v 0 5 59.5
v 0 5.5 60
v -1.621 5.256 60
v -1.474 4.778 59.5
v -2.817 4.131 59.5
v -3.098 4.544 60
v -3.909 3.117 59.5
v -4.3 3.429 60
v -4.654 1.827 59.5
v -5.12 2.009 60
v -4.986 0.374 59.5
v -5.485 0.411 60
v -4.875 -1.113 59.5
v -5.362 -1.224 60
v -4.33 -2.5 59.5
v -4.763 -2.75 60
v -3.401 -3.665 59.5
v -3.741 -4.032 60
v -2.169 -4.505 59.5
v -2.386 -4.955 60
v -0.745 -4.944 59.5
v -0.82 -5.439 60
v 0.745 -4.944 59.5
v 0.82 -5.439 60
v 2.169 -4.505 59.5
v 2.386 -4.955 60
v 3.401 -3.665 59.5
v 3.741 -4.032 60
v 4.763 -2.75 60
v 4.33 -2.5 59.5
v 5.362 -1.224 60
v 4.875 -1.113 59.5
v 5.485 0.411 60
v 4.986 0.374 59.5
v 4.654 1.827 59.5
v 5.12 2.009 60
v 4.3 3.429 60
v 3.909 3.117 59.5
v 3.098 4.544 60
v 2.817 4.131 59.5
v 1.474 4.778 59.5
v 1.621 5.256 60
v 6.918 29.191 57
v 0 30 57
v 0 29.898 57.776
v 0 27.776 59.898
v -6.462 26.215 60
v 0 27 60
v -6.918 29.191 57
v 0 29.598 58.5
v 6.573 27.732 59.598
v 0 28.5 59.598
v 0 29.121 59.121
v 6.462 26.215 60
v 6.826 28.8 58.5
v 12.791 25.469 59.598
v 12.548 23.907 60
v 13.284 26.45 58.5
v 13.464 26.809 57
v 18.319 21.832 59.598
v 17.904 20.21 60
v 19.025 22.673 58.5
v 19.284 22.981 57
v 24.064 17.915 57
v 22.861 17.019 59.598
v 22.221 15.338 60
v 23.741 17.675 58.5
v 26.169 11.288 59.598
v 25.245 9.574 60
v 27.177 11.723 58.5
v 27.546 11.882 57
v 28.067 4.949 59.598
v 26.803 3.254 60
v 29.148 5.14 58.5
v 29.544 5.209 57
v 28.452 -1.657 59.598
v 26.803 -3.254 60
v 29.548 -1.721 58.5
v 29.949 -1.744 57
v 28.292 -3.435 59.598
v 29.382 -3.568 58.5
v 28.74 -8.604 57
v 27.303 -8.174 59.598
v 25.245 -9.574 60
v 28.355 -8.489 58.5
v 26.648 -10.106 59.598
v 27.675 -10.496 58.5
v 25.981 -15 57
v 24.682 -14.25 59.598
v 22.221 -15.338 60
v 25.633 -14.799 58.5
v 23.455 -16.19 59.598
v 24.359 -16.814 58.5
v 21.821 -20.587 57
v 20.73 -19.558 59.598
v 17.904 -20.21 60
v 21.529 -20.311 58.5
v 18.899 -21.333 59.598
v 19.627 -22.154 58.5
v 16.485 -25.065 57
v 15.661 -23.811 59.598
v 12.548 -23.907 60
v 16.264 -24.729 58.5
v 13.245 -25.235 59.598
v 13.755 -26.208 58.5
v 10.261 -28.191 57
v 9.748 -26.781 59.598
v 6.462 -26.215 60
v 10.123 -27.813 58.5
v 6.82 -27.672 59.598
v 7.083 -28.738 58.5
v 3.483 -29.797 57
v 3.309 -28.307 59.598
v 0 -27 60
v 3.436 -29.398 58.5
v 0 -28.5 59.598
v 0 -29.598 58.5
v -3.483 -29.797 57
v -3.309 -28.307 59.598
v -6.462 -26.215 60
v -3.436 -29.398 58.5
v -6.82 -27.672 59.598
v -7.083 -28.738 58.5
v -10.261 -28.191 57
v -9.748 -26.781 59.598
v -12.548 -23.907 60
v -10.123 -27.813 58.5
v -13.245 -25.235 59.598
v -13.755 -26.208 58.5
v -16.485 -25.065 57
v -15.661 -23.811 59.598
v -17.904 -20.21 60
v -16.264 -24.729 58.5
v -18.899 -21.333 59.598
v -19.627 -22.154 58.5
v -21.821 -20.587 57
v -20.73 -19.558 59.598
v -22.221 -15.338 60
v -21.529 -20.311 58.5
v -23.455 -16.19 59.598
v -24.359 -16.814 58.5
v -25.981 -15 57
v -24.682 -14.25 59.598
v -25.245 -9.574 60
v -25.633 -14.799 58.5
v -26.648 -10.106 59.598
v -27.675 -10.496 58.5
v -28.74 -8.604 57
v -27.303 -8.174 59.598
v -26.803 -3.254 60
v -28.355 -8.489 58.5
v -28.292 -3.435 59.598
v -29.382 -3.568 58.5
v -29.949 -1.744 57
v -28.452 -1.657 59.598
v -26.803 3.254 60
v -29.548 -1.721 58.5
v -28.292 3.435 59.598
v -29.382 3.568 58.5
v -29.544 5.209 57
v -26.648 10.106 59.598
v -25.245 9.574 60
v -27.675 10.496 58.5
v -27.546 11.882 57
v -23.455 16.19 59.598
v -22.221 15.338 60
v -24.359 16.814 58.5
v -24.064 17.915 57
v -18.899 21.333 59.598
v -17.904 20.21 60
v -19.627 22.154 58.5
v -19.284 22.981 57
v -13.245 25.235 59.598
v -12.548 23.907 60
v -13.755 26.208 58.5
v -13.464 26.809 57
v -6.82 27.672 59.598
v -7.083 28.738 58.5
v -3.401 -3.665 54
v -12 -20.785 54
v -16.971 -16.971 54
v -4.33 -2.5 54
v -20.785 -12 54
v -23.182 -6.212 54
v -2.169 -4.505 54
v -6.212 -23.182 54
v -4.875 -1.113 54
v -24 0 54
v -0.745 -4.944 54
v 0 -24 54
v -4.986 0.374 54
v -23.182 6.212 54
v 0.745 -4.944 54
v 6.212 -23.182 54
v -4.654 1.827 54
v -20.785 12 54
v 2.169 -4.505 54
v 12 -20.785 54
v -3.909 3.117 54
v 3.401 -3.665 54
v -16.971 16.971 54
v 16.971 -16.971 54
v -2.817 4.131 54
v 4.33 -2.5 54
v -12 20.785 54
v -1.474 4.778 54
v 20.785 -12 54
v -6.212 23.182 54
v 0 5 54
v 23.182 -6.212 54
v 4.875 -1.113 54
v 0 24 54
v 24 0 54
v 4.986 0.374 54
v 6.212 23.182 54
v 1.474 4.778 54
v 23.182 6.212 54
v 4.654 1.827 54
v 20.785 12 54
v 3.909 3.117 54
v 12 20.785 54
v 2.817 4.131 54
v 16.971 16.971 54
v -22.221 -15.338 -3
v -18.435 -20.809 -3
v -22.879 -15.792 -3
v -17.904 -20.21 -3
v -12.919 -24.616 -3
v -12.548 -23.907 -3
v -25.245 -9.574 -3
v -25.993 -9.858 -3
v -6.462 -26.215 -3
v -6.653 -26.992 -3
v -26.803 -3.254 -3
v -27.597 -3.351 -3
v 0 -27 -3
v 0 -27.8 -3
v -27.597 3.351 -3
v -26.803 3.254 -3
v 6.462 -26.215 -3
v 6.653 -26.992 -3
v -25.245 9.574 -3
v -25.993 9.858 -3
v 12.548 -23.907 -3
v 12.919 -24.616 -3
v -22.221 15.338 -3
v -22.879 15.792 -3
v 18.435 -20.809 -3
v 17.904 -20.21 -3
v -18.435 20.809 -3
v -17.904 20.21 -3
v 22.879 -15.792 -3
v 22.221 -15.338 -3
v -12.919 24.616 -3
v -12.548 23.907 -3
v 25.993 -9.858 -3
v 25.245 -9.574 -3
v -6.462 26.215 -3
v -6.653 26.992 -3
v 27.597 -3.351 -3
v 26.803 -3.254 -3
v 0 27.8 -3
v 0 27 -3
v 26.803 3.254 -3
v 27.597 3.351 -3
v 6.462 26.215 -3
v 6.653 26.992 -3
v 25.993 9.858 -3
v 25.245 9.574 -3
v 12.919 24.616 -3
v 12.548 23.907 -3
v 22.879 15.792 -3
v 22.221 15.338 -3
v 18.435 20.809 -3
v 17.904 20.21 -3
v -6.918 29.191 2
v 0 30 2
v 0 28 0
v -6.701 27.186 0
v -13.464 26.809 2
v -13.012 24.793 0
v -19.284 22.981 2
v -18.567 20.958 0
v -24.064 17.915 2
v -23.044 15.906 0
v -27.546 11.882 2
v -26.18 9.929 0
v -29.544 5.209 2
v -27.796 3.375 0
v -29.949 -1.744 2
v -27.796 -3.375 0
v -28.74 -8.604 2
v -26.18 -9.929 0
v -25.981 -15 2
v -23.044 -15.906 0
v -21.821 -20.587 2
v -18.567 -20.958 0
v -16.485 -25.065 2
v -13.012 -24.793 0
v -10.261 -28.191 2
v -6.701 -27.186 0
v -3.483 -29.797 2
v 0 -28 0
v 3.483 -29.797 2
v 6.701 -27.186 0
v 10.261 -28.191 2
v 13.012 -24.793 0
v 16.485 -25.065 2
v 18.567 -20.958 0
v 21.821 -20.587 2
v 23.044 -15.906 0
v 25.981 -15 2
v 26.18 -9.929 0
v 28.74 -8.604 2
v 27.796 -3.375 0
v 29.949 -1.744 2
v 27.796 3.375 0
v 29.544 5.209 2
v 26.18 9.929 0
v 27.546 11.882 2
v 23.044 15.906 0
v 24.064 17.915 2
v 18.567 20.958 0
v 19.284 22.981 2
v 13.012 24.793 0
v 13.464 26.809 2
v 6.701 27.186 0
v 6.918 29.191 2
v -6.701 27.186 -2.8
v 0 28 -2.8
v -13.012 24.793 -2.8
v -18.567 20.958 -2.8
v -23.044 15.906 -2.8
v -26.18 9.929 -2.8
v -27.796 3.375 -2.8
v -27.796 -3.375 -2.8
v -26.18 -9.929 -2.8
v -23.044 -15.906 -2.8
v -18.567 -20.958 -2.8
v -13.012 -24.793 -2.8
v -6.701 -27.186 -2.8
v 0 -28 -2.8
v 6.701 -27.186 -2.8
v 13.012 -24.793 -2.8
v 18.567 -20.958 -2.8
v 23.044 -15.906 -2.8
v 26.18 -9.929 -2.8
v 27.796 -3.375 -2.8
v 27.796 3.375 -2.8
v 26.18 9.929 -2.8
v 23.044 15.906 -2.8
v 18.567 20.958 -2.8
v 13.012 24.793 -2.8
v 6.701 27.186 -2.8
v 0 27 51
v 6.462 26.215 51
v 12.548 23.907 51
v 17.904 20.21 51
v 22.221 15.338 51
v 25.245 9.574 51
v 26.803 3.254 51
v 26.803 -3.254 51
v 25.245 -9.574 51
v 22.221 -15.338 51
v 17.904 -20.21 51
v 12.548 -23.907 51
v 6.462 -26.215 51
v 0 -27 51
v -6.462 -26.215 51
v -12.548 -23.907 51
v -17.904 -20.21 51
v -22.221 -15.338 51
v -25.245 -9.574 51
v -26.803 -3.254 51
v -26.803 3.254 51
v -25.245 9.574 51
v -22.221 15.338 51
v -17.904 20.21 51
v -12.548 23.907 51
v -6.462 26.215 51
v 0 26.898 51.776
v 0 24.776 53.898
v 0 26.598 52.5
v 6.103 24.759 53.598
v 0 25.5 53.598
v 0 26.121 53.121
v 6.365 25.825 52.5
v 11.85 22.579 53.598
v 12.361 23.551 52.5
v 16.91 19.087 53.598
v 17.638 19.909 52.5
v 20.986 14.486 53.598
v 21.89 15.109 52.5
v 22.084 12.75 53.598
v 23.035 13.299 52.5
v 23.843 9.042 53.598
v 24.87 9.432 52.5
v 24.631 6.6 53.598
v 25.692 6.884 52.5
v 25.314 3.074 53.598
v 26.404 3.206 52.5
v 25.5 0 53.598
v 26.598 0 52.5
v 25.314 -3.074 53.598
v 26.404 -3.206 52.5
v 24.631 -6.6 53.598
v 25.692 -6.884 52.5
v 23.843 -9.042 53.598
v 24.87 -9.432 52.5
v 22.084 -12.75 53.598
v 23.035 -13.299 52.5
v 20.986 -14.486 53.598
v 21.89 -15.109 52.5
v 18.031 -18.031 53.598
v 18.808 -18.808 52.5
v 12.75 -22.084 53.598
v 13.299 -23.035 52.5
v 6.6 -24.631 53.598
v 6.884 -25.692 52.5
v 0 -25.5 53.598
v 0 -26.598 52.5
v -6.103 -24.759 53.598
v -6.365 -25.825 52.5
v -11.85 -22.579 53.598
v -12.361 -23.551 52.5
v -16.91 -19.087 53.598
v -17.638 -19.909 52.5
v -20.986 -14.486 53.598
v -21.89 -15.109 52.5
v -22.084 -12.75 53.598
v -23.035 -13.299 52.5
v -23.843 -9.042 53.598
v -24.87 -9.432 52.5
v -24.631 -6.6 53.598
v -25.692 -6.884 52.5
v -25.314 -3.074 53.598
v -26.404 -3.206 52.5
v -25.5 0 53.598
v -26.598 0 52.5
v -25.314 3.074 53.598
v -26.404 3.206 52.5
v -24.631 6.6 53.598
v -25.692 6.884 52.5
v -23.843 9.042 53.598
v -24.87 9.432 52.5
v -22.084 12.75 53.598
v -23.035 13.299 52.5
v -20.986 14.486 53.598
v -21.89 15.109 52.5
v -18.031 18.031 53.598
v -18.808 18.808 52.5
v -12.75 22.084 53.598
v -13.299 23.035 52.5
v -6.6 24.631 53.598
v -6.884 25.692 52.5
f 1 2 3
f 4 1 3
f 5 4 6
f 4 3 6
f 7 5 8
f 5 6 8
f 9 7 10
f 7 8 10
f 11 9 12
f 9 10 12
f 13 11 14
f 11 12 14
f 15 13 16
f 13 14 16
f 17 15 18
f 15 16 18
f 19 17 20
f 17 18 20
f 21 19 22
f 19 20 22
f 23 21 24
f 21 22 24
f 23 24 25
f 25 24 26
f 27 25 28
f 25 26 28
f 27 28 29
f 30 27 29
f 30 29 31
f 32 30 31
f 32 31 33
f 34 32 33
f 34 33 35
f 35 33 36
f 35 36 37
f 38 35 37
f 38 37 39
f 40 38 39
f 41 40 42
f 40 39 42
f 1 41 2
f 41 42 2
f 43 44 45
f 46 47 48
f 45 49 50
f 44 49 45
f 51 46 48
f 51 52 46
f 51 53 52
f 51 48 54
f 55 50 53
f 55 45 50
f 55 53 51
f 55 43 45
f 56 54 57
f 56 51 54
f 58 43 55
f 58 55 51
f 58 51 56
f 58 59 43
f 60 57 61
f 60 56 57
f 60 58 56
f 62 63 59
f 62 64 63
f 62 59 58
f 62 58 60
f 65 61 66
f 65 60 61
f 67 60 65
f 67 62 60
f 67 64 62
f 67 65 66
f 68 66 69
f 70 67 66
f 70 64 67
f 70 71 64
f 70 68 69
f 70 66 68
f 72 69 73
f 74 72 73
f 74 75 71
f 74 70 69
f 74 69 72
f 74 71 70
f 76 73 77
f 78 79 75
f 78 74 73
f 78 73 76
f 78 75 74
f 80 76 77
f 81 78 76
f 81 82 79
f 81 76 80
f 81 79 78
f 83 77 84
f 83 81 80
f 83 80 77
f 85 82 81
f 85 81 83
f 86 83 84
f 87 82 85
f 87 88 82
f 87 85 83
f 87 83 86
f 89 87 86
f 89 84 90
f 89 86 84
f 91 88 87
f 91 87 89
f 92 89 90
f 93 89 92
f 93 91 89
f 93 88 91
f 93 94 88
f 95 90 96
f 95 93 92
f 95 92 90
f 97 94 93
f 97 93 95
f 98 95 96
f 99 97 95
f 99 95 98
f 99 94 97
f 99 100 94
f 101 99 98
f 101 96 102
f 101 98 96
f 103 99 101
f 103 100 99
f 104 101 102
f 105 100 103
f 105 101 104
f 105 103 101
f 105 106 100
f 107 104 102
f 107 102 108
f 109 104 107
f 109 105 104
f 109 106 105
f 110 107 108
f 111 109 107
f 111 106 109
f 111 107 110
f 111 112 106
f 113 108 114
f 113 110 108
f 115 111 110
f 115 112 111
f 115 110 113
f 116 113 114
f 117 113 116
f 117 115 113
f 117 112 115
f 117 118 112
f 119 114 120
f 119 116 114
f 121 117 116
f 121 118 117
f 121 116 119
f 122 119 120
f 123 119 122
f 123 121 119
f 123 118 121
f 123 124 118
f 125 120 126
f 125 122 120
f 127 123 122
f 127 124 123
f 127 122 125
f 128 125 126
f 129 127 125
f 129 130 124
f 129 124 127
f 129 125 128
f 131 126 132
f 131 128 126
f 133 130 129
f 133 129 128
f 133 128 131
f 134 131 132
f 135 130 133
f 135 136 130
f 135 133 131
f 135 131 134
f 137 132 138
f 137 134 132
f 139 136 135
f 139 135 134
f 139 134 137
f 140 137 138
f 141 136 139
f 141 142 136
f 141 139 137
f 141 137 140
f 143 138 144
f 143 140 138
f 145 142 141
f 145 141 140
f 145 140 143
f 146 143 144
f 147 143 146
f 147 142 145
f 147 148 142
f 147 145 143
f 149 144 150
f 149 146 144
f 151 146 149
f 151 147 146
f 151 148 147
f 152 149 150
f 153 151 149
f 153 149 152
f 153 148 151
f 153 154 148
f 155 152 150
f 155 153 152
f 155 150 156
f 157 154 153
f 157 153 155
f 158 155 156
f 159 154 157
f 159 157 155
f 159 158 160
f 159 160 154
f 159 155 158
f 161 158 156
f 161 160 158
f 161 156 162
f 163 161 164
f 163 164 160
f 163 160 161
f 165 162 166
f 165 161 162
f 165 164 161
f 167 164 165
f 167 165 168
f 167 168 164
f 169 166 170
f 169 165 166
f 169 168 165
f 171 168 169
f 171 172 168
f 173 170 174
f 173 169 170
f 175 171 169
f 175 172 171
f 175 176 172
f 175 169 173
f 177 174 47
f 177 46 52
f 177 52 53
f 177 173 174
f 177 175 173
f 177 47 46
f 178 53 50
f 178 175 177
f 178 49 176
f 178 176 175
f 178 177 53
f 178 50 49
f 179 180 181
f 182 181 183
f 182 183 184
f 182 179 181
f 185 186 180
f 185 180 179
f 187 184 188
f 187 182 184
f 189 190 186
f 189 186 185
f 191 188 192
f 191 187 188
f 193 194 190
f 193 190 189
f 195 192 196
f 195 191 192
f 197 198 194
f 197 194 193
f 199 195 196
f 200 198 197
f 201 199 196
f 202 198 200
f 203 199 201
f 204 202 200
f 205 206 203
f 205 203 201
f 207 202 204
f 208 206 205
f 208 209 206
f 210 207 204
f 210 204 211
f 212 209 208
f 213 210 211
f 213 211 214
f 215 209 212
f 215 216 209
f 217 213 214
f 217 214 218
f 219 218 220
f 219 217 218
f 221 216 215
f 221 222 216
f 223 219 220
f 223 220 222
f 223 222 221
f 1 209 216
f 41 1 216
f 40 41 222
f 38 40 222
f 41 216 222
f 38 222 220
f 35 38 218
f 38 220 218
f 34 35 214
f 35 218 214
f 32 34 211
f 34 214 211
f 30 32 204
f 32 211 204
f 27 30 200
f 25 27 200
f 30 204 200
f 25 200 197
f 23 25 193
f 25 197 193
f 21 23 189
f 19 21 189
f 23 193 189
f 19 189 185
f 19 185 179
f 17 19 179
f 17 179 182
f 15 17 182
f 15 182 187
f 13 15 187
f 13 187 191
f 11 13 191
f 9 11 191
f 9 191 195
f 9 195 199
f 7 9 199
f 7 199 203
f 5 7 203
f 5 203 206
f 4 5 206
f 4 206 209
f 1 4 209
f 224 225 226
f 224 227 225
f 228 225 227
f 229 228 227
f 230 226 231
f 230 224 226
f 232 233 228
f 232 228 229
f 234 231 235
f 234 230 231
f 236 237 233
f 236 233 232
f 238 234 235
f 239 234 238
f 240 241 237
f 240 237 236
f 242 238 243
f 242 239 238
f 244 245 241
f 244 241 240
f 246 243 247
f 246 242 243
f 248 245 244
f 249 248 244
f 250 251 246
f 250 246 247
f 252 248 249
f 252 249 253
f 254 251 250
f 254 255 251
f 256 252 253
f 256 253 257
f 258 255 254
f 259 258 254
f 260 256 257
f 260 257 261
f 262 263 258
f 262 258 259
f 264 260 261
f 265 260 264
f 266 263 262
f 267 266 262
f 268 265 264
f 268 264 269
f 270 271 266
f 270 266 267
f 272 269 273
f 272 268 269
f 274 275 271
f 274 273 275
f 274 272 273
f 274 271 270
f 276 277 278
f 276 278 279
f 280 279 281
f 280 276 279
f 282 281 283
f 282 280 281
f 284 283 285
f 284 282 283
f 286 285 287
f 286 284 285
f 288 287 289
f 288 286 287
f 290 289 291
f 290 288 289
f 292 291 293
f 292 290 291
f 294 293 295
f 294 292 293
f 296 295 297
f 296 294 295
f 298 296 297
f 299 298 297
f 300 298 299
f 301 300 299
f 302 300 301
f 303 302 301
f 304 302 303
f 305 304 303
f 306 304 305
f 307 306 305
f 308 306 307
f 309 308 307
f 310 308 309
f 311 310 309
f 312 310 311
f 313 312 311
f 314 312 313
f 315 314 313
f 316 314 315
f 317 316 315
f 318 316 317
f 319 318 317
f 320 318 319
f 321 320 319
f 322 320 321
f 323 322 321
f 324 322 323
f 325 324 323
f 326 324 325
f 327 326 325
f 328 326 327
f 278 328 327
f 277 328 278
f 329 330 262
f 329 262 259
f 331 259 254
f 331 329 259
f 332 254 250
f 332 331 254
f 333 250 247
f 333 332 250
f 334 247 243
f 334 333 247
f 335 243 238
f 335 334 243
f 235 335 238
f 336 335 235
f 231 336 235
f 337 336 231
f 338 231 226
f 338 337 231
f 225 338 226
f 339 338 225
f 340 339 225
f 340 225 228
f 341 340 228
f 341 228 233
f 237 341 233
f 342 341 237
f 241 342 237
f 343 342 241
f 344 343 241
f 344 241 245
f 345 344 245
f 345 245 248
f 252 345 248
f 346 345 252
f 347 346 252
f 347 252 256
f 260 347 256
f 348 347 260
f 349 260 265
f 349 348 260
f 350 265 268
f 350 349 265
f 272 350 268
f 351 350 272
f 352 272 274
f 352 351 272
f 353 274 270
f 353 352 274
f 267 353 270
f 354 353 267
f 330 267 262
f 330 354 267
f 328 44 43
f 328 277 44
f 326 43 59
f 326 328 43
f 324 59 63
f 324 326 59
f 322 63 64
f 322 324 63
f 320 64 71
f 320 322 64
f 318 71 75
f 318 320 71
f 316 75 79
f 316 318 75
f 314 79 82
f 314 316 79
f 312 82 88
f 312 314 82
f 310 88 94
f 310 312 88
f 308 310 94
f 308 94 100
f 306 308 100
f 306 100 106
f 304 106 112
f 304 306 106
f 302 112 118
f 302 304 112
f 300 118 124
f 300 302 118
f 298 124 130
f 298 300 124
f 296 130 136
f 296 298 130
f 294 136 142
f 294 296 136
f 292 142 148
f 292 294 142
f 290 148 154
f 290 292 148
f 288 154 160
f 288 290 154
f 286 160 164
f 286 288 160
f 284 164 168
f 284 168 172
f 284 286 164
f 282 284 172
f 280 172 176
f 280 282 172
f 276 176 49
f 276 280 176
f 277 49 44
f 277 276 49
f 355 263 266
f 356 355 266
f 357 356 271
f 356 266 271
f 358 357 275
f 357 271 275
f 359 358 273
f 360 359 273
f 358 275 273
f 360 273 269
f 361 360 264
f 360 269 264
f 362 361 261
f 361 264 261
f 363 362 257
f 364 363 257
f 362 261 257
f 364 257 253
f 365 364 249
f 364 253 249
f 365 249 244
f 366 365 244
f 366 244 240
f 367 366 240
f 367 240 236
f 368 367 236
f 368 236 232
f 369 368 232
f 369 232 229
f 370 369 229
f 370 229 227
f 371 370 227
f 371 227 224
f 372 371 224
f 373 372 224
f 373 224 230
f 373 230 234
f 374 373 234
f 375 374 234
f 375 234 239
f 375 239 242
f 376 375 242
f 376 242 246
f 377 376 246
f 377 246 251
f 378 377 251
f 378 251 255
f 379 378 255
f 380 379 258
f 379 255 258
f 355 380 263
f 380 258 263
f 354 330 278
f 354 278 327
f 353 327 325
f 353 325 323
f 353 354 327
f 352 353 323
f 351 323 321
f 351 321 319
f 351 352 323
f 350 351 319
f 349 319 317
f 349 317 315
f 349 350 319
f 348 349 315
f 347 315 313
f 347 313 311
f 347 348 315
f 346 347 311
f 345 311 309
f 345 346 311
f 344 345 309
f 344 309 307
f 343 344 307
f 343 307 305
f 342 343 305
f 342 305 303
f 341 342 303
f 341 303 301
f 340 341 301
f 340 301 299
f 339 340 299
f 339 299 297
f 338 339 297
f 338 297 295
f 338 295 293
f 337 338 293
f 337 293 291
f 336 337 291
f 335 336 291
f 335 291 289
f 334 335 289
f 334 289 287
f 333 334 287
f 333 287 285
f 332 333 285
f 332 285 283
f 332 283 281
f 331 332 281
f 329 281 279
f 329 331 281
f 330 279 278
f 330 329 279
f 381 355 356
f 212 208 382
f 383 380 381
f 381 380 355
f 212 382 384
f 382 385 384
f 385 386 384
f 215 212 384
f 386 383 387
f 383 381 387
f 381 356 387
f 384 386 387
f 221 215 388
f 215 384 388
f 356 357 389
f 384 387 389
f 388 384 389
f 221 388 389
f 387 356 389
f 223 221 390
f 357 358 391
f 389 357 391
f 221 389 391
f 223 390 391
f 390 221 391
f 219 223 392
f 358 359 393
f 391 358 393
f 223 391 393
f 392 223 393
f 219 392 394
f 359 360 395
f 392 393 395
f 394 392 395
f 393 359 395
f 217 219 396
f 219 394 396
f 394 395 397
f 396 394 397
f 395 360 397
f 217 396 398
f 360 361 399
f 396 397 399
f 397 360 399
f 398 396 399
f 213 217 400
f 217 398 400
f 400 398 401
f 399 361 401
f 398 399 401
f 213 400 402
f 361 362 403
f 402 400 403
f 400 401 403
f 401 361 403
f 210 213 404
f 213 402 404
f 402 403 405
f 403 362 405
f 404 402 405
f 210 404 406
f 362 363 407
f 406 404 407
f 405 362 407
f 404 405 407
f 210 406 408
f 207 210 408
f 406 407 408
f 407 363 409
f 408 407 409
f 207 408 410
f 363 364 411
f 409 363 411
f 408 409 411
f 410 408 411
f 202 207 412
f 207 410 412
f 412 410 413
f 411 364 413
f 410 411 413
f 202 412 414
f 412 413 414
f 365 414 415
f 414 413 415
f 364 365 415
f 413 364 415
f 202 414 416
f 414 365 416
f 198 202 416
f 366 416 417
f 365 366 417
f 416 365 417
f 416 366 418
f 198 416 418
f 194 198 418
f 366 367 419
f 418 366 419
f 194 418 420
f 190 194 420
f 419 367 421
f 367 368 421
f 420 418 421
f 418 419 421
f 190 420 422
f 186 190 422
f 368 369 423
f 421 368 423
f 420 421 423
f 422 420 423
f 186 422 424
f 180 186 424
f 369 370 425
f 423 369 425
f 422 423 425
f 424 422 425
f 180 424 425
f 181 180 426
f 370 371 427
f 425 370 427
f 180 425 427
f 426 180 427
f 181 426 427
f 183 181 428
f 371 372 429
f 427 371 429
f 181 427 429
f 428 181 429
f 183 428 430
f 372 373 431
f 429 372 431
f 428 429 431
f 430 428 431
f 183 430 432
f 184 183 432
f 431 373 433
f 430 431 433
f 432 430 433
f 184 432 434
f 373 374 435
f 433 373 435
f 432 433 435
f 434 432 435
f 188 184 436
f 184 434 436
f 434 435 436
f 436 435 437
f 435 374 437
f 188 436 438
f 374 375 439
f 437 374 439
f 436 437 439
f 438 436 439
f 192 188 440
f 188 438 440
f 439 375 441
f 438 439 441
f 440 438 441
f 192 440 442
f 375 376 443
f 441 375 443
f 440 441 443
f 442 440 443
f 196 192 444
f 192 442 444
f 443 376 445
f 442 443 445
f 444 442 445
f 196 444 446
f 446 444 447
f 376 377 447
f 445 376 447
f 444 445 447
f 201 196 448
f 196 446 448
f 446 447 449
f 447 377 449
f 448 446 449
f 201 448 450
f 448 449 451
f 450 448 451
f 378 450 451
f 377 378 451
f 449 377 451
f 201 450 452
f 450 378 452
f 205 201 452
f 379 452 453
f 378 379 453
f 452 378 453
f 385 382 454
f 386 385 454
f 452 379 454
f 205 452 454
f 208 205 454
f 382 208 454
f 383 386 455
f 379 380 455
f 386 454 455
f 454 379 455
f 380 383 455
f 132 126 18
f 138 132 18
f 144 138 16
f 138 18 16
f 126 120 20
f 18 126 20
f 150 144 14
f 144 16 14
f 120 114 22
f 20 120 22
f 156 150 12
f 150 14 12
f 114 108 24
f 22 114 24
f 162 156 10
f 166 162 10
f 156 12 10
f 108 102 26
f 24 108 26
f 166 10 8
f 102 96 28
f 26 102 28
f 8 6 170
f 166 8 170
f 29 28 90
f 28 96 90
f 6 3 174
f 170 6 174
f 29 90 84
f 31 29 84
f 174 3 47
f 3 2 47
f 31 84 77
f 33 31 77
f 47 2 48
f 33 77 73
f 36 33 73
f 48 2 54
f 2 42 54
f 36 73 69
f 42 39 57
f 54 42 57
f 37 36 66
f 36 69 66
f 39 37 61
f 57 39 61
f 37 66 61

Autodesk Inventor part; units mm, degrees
ref_plane "YZ Plane" through (0, 0, 0) normal (1, 0, 0) x (0, 1, 0)
ref_plane "XZ Plane" through (0, 0, 0) normal (0, 1, 0) x (-1, 0, 0)
ref_plane "XY Plane" through (0, 0, 0) normal (0, 0, 1) x (1, 0, 0)
sketch "Sketch2" plane through (0, 0, 0) normal (1, 0, 0) x (0, 1, 0)
  line L0 (0, 0) -> (30, 0)
  line L1 (30, 60) -> (30, -60)
  line L2 (30, 60) -> (27, 60)
  line L3 (27, 60) -> (27, -60)
  line L4 (27, -60) -> (30, -60)
  line L5 (27, 60) -> (0, 60)
  line L6 (0, 60) -> (5, 60)
  line L7 (5, 60) -> (5, 54)
  line L8 (5, 54) -> (27, 54)
  line L9 (27, -60) -> (0, -60)
  line L10 (0, -60) -> (5, -60)
  line L11 (5, -60) -> (5, -54)
  line L12 (5, -54) -> (27, -54)
  line L13 (0, 60) -> (0, -60)
  line L14 (27, 0) -> (28, 0)
  line L15 (28, 0) -> (28, -3)
  line L16 (28, -3) -> (27, -3)
  line L17 (28, 0) -> (28, 2)
  line L18 (28, 2) -> (30, 2)
  line L19 (30, 2) -> (28, 0)
  dimension "d12" = 30
  dimension "d13" = 120
  dimension "d14" = 3
  dimension "d15" = 5
  dimension "d16" = 6
  dimension "d17" = 6
  dimension "d26" = 1
  dimension "d27" = 3
  dimension "d28" = 2
revolve "Revolution1" add sketch "Sketch2" angle 360 about axis through (0, 0, 60) along (0, 0, -1) contours L3 L2 L1 L18 L17 L0 | L0 L15 L16 L3 | L17 L18 L19 | L8 L7 L5 L3
fillet "Fillet2" radius 3 1 edges at (0, -30, 60)
thread "Thread3" size "M10x1.5" class "6H" standard "ISO Metric profile" full length
chamfer "Chamfer2" distance 0.5 angle 45 1 edges at (0, -5, 60)
fillet "Fillet3" radius 3 1 edges at (0, -27, 54)
chamfer "Chamfer3" distance 0.2 angle 45 1 edges at (0, -28, -3)
properties part number "Plenum"
